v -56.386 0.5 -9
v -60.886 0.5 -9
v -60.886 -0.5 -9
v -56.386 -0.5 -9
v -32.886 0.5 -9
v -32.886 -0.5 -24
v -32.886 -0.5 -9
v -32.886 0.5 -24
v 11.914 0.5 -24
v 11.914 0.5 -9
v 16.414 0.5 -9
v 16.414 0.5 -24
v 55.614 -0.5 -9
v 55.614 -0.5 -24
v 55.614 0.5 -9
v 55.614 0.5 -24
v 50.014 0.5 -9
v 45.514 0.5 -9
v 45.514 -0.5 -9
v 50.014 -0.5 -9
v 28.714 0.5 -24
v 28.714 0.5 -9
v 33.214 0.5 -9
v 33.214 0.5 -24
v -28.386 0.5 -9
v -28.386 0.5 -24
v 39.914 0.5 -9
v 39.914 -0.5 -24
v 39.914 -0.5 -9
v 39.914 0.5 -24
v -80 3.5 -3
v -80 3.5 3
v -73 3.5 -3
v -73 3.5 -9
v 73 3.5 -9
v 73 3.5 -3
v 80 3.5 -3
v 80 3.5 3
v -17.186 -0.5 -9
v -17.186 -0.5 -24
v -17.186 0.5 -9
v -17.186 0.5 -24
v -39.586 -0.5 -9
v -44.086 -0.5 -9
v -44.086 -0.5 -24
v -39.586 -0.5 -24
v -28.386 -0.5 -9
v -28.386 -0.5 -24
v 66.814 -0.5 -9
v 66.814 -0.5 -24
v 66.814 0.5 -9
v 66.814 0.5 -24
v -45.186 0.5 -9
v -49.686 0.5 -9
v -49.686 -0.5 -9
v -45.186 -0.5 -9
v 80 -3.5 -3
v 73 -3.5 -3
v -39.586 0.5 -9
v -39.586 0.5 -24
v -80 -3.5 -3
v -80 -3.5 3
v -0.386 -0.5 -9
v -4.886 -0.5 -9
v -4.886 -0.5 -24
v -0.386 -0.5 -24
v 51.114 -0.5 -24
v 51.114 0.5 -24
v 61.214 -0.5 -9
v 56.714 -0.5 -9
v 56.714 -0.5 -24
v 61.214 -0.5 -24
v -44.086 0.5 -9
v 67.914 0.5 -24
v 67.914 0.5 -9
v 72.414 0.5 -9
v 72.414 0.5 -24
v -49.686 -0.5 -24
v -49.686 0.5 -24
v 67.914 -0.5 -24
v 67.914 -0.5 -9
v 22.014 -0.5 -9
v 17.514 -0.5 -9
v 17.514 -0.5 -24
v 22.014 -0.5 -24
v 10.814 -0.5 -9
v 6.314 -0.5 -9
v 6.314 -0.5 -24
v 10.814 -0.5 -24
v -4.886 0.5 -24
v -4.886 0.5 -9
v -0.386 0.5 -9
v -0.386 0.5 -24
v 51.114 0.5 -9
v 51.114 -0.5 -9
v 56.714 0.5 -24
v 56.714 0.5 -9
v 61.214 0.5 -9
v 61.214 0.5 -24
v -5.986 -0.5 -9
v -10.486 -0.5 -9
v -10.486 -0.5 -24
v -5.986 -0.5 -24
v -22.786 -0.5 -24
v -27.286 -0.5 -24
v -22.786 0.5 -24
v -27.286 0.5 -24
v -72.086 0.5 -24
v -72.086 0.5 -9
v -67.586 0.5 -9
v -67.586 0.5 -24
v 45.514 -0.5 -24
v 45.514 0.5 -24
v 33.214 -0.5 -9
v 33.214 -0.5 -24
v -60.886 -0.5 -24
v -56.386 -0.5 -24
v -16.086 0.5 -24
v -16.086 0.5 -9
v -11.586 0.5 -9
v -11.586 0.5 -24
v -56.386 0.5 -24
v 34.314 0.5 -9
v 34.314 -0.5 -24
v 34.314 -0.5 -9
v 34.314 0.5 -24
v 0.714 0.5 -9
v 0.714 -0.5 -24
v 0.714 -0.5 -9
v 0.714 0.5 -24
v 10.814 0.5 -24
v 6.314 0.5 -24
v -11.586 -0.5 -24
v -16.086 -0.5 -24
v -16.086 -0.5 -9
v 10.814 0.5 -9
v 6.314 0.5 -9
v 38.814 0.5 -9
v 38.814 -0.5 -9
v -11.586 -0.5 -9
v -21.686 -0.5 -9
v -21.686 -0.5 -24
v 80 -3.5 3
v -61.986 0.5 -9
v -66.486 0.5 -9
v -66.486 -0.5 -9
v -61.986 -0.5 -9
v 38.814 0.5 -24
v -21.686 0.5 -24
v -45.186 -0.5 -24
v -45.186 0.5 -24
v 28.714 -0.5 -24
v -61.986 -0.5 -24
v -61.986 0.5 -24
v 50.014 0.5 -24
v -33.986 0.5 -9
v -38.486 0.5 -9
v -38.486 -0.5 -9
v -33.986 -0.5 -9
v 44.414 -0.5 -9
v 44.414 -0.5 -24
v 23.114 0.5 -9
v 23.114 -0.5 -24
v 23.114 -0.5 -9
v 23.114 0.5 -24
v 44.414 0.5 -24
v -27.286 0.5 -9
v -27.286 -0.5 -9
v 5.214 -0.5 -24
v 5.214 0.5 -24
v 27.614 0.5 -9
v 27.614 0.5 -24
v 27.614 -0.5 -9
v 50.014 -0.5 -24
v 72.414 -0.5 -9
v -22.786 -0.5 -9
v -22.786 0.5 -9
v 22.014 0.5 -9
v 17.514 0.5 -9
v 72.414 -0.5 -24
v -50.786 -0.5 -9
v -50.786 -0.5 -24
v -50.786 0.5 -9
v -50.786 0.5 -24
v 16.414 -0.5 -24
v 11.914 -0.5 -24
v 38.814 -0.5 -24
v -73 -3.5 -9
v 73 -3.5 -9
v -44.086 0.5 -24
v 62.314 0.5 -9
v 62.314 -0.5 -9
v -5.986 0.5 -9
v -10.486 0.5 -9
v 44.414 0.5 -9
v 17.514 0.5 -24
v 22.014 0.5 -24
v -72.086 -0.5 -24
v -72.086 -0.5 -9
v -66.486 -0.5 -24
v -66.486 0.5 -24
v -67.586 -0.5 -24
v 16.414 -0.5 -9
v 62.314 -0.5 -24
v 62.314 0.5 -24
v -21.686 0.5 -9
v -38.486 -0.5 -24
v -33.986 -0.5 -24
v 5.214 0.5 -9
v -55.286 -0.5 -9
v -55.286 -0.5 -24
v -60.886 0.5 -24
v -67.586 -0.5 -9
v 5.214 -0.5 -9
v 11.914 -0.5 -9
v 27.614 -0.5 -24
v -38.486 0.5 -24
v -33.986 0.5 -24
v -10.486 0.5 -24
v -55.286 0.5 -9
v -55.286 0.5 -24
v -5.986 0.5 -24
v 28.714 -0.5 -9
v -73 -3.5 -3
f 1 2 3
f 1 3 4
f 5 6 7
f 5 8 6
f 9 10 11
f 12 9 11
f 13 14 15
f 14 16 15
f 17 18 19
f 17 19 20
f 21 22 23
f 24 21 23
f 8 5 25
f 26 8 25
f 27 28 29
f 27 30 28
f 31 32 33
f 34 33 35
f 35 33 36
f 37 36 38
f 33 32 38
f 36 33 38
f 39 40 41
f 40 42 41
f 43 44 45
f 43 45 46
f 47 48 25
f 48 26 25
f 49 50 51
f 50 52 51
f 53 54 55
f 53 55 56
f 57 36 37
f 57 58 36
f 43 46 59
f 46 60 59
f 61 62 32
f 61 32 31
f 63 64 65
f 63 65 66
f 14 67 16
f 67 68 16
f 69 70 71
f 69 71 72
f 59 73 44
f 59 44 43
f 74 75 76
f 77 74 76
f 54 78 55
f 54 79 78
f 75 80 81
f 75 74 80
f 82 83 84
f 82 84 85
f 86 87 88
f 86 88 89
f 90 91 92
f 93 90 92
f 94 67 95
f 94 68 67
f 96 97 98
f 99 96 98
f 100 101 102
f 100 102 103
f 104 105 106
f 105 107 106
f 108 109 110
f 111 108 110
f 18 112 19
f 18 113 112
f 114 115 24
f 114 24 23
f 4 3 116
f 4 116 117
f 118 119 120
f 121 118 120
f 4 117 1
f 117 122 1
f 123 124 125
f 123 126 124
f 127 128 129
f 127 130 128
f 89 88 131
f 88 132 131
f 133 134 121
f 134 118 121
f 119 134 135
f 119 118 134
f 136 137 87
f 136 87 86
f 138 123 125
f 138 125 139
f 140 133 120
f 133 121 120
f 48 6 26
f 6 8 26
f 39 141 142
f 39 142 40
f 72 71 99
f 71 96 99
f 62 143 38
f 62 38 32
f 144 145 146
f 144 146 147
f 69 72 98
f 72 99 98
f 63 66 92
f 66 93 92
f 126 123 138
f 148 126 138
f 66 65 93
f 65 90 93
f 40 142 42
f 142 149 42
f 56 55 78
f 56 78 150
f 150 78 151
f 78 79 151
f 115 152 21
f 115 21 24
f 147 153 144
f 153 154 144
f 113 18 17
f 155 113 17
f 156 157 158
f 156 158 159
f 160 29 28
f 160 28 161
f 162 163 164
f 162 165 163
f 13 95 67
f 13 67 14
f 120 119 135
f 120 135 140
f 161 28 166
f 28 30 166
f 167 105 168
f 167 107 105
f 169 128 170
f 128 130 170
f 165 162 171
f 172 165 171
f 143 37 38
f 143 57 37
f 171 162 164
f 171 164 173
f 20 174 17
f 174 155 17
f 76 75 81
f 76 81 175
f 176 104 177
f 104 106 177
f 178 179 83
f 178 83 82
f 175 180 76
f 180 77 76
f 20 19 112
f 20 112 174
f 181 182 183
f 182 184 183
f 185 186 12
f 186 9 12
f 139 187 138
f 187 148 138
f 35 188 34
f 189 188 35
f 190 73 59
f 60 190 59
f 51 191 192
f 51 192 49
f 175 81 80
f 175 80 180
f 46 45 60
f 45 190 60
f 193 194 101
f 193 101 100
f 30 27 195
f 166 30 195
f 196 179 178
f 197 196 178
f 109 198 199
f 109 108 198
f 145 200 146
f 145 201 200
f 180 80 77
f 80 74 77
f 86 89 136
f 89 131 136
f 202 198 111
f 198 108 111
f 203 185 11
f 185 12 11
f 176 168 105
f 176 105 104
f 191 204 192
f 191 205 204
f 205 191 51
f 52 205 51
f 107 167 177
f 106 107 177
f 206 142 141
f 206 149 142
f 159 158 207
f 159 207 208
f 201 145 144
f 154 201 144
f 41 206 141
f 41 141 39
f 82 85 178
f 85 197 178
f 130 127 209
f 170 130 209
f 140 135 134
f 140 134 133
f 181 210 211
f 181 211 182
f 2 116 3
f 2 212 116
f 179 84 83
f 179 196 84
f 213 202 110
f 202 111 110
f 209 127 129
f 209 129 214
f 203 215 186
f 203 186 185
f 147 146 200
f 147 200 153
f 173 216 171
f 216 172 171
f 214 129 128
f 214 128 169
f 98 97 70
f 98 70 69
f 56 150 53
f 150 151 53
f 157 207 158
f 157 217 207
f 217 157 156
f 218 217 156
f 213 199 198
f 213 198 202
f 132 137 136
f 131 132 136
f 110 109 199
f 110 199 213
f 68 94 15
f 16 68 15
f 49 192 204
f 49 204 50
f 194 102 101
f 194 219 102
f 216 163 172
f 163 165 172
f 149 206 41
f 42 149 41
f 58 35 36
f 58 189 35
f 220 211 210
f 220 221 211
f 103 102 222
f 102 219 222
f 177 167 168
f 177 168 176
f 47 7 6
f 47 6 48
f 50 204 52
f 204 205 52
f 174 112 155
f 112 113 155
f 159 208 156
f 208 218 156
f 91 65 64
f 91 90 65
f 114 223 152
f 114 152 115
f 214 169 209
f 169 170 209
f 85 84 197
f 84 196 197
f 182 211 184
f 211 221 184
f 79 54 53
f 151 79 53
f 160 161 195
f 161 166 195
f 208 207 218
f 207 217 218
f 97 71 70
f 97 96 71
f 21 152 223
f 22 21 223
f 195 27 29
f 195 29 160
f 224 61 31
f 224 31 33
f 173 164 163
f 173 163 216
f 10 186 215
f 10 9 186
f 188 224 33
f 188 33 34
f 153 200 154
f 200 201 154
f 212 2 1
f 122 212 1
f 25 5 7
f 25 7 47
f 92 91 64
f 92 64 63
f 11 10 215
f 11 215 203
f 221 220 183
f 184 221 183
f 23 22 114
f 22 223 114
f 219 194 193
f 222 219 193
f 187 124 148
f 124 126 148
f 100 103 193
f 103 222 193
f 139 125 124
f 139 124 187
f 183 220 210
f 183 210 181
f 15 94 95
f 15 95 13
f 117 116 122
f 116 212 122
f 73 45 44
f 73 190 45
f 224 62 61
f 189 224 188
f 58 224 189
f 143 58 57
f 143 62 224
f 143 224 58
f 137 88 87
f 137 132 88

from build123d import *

# Parameters (mm, degrees)
F0_W     = 4.5
F0_H     = 15
F1_DEPTH = 0.5
F2_DEPTH = 3.5


with BuildPart() as f1:
    # F0 (on Front) → F1 (new body, symmetric)
    with BuildSketch(Plane.XZ):
        with Locations((70.164407, -16.5)):
            Rectangle(F0_W, F0_H)
        with Locations((53.364407, -16.5)):
            Rectangle(F0_W, F0_H)
        with Locations((58.964407, -16.5)):
            Rectangle(F0_W, F0_H)
        with Locations((19.764407, -16.5)):
            Rectangle(F0_W, F0_H)
        with Locations((64.564407, -16.5)):
            Rectangle(F0_W, F0_H)
        with Locations((25.364407, -16.5)):
            Rectangle(F0_W, F0_H)
        with Locations((-8.235593, -16.5)):
            Rectangle(F0_W, F0_H)
        with Locations((-13.835593, -16.5)):
            Rectangle(F0_W, F0_H)
        with Locations((-19.435593, -16.5)):
            Rectangle(F0_W, F0_H)
        with Locations((-30.635593, -16.5)):
            Rectangle(F0_W, F0_H)
        with Locations((-25.035593, -16.5)):
            Rectangle(F0_W, F0_H)
        with Locations((-36.235593, -16.5)):
            Rectangle(F0_W, F0_H)
        with Locations((-41.835593, -16.5)):
            Rectangle(F0_W, F0_H)
        with Locations((-47.435593, -16.5)):
            Rectangle(F0_W, F0_H)
        with Locations((-53.035593, -16.5)):
            Rectangle(F0_W, F0_H)
        with Locations((-58.635593, -16.5)):
            Rectangle(F0_W, F0_H)
        with Locations((-64.235593, -16.5)):
            Rectangle(F0_W, F0_H)
        with Locations((-69.835593, -16.5)):
            Rectangle(F0_W, F0_H)
        with Locations((14.164407, -16.5)):
            Rectangle(F0_W, F0_H)
        with Locations((2.964407, -16.5)):
            Rectangle(F0_W, F0_H)
        with Locations((-2.635593, -16.5)):
            Rectangle(F0_W, F0_H)
        with Locations((8.564407, -16.5)):
            Rectangle(F0_W, F0_H)
        with Locations((47.764407, -16.5)):
            Rectangle(F0_W, F0_H)
        with Locations((42.164407, -16.5)):
            Rectangle(F0_W, F0_H)
        with Locations((36.564407, -16.5)):
            Rectangle(F0_W, F0_H)
        with Locations((30.964407, -16.5)):
            Rectangle(F0_W, F0_H)
    extrude(amount=F1_DEPTH, both=True)


with BuildPart() as f2:
    # F0 (on Front) → F2 (new body, symmetric)
    with BuildSketch(Plane.XZ):
        Polygon((80, -3), (80, 3), (-80, 3), (-80, -3), (-73, -3), (73, -3), align=None)
        Polygon((73, -9), (73, -3), (-73, -3), (-73, -9), (-72.085593, -9), (-67.585593, -9), (-66.485593, -9), (-61.985593, -9), (-60.885593, -9), (-56.385593, -9), (-55.285593, -9), (-50.785593, -9), (-49.685593, -9), (-45.185593, -9), (-44.085593, -9), (-39.585593, -9), (-38.485593, -9), (-33.985593, -9), (-32.885593, -9), (-28.385593, -9), (-27.285593, -9), (-22.785593, -9), (-21.685593, -9), (-17.185593, -9), (-16.085593, -9), (-11.585593, -9), (-10.485593, -9), (-5.985593, -9), (-4.885593, -9), (-0.385593, -9), (0.714407, -9), (5.214407, -9), (6.314407, -9), (10.814407, -9), (11.914407, -9), (16.414407, -9), (17.514407, -9), (22.014407, -9), (23.114407, -9), (27.614407, -9), (28.714407, -9), (33.214407, -9), (34.314407, -9), (38.814407, -9), (39.914407, -9), (44.414407, -9), (45.514407, -9), (50.014407, -9), (51.114407, -9), (55.614407, -9), (56.714407, -9), (61.214407, -9), (62.314407, -9), (66.814407, -9), (67.914407, -9), (72.414407, -9), align=None)
    extrude(amount=F2_DEPTH, both=True)


solid = Compound([f1.part, f2.part])
